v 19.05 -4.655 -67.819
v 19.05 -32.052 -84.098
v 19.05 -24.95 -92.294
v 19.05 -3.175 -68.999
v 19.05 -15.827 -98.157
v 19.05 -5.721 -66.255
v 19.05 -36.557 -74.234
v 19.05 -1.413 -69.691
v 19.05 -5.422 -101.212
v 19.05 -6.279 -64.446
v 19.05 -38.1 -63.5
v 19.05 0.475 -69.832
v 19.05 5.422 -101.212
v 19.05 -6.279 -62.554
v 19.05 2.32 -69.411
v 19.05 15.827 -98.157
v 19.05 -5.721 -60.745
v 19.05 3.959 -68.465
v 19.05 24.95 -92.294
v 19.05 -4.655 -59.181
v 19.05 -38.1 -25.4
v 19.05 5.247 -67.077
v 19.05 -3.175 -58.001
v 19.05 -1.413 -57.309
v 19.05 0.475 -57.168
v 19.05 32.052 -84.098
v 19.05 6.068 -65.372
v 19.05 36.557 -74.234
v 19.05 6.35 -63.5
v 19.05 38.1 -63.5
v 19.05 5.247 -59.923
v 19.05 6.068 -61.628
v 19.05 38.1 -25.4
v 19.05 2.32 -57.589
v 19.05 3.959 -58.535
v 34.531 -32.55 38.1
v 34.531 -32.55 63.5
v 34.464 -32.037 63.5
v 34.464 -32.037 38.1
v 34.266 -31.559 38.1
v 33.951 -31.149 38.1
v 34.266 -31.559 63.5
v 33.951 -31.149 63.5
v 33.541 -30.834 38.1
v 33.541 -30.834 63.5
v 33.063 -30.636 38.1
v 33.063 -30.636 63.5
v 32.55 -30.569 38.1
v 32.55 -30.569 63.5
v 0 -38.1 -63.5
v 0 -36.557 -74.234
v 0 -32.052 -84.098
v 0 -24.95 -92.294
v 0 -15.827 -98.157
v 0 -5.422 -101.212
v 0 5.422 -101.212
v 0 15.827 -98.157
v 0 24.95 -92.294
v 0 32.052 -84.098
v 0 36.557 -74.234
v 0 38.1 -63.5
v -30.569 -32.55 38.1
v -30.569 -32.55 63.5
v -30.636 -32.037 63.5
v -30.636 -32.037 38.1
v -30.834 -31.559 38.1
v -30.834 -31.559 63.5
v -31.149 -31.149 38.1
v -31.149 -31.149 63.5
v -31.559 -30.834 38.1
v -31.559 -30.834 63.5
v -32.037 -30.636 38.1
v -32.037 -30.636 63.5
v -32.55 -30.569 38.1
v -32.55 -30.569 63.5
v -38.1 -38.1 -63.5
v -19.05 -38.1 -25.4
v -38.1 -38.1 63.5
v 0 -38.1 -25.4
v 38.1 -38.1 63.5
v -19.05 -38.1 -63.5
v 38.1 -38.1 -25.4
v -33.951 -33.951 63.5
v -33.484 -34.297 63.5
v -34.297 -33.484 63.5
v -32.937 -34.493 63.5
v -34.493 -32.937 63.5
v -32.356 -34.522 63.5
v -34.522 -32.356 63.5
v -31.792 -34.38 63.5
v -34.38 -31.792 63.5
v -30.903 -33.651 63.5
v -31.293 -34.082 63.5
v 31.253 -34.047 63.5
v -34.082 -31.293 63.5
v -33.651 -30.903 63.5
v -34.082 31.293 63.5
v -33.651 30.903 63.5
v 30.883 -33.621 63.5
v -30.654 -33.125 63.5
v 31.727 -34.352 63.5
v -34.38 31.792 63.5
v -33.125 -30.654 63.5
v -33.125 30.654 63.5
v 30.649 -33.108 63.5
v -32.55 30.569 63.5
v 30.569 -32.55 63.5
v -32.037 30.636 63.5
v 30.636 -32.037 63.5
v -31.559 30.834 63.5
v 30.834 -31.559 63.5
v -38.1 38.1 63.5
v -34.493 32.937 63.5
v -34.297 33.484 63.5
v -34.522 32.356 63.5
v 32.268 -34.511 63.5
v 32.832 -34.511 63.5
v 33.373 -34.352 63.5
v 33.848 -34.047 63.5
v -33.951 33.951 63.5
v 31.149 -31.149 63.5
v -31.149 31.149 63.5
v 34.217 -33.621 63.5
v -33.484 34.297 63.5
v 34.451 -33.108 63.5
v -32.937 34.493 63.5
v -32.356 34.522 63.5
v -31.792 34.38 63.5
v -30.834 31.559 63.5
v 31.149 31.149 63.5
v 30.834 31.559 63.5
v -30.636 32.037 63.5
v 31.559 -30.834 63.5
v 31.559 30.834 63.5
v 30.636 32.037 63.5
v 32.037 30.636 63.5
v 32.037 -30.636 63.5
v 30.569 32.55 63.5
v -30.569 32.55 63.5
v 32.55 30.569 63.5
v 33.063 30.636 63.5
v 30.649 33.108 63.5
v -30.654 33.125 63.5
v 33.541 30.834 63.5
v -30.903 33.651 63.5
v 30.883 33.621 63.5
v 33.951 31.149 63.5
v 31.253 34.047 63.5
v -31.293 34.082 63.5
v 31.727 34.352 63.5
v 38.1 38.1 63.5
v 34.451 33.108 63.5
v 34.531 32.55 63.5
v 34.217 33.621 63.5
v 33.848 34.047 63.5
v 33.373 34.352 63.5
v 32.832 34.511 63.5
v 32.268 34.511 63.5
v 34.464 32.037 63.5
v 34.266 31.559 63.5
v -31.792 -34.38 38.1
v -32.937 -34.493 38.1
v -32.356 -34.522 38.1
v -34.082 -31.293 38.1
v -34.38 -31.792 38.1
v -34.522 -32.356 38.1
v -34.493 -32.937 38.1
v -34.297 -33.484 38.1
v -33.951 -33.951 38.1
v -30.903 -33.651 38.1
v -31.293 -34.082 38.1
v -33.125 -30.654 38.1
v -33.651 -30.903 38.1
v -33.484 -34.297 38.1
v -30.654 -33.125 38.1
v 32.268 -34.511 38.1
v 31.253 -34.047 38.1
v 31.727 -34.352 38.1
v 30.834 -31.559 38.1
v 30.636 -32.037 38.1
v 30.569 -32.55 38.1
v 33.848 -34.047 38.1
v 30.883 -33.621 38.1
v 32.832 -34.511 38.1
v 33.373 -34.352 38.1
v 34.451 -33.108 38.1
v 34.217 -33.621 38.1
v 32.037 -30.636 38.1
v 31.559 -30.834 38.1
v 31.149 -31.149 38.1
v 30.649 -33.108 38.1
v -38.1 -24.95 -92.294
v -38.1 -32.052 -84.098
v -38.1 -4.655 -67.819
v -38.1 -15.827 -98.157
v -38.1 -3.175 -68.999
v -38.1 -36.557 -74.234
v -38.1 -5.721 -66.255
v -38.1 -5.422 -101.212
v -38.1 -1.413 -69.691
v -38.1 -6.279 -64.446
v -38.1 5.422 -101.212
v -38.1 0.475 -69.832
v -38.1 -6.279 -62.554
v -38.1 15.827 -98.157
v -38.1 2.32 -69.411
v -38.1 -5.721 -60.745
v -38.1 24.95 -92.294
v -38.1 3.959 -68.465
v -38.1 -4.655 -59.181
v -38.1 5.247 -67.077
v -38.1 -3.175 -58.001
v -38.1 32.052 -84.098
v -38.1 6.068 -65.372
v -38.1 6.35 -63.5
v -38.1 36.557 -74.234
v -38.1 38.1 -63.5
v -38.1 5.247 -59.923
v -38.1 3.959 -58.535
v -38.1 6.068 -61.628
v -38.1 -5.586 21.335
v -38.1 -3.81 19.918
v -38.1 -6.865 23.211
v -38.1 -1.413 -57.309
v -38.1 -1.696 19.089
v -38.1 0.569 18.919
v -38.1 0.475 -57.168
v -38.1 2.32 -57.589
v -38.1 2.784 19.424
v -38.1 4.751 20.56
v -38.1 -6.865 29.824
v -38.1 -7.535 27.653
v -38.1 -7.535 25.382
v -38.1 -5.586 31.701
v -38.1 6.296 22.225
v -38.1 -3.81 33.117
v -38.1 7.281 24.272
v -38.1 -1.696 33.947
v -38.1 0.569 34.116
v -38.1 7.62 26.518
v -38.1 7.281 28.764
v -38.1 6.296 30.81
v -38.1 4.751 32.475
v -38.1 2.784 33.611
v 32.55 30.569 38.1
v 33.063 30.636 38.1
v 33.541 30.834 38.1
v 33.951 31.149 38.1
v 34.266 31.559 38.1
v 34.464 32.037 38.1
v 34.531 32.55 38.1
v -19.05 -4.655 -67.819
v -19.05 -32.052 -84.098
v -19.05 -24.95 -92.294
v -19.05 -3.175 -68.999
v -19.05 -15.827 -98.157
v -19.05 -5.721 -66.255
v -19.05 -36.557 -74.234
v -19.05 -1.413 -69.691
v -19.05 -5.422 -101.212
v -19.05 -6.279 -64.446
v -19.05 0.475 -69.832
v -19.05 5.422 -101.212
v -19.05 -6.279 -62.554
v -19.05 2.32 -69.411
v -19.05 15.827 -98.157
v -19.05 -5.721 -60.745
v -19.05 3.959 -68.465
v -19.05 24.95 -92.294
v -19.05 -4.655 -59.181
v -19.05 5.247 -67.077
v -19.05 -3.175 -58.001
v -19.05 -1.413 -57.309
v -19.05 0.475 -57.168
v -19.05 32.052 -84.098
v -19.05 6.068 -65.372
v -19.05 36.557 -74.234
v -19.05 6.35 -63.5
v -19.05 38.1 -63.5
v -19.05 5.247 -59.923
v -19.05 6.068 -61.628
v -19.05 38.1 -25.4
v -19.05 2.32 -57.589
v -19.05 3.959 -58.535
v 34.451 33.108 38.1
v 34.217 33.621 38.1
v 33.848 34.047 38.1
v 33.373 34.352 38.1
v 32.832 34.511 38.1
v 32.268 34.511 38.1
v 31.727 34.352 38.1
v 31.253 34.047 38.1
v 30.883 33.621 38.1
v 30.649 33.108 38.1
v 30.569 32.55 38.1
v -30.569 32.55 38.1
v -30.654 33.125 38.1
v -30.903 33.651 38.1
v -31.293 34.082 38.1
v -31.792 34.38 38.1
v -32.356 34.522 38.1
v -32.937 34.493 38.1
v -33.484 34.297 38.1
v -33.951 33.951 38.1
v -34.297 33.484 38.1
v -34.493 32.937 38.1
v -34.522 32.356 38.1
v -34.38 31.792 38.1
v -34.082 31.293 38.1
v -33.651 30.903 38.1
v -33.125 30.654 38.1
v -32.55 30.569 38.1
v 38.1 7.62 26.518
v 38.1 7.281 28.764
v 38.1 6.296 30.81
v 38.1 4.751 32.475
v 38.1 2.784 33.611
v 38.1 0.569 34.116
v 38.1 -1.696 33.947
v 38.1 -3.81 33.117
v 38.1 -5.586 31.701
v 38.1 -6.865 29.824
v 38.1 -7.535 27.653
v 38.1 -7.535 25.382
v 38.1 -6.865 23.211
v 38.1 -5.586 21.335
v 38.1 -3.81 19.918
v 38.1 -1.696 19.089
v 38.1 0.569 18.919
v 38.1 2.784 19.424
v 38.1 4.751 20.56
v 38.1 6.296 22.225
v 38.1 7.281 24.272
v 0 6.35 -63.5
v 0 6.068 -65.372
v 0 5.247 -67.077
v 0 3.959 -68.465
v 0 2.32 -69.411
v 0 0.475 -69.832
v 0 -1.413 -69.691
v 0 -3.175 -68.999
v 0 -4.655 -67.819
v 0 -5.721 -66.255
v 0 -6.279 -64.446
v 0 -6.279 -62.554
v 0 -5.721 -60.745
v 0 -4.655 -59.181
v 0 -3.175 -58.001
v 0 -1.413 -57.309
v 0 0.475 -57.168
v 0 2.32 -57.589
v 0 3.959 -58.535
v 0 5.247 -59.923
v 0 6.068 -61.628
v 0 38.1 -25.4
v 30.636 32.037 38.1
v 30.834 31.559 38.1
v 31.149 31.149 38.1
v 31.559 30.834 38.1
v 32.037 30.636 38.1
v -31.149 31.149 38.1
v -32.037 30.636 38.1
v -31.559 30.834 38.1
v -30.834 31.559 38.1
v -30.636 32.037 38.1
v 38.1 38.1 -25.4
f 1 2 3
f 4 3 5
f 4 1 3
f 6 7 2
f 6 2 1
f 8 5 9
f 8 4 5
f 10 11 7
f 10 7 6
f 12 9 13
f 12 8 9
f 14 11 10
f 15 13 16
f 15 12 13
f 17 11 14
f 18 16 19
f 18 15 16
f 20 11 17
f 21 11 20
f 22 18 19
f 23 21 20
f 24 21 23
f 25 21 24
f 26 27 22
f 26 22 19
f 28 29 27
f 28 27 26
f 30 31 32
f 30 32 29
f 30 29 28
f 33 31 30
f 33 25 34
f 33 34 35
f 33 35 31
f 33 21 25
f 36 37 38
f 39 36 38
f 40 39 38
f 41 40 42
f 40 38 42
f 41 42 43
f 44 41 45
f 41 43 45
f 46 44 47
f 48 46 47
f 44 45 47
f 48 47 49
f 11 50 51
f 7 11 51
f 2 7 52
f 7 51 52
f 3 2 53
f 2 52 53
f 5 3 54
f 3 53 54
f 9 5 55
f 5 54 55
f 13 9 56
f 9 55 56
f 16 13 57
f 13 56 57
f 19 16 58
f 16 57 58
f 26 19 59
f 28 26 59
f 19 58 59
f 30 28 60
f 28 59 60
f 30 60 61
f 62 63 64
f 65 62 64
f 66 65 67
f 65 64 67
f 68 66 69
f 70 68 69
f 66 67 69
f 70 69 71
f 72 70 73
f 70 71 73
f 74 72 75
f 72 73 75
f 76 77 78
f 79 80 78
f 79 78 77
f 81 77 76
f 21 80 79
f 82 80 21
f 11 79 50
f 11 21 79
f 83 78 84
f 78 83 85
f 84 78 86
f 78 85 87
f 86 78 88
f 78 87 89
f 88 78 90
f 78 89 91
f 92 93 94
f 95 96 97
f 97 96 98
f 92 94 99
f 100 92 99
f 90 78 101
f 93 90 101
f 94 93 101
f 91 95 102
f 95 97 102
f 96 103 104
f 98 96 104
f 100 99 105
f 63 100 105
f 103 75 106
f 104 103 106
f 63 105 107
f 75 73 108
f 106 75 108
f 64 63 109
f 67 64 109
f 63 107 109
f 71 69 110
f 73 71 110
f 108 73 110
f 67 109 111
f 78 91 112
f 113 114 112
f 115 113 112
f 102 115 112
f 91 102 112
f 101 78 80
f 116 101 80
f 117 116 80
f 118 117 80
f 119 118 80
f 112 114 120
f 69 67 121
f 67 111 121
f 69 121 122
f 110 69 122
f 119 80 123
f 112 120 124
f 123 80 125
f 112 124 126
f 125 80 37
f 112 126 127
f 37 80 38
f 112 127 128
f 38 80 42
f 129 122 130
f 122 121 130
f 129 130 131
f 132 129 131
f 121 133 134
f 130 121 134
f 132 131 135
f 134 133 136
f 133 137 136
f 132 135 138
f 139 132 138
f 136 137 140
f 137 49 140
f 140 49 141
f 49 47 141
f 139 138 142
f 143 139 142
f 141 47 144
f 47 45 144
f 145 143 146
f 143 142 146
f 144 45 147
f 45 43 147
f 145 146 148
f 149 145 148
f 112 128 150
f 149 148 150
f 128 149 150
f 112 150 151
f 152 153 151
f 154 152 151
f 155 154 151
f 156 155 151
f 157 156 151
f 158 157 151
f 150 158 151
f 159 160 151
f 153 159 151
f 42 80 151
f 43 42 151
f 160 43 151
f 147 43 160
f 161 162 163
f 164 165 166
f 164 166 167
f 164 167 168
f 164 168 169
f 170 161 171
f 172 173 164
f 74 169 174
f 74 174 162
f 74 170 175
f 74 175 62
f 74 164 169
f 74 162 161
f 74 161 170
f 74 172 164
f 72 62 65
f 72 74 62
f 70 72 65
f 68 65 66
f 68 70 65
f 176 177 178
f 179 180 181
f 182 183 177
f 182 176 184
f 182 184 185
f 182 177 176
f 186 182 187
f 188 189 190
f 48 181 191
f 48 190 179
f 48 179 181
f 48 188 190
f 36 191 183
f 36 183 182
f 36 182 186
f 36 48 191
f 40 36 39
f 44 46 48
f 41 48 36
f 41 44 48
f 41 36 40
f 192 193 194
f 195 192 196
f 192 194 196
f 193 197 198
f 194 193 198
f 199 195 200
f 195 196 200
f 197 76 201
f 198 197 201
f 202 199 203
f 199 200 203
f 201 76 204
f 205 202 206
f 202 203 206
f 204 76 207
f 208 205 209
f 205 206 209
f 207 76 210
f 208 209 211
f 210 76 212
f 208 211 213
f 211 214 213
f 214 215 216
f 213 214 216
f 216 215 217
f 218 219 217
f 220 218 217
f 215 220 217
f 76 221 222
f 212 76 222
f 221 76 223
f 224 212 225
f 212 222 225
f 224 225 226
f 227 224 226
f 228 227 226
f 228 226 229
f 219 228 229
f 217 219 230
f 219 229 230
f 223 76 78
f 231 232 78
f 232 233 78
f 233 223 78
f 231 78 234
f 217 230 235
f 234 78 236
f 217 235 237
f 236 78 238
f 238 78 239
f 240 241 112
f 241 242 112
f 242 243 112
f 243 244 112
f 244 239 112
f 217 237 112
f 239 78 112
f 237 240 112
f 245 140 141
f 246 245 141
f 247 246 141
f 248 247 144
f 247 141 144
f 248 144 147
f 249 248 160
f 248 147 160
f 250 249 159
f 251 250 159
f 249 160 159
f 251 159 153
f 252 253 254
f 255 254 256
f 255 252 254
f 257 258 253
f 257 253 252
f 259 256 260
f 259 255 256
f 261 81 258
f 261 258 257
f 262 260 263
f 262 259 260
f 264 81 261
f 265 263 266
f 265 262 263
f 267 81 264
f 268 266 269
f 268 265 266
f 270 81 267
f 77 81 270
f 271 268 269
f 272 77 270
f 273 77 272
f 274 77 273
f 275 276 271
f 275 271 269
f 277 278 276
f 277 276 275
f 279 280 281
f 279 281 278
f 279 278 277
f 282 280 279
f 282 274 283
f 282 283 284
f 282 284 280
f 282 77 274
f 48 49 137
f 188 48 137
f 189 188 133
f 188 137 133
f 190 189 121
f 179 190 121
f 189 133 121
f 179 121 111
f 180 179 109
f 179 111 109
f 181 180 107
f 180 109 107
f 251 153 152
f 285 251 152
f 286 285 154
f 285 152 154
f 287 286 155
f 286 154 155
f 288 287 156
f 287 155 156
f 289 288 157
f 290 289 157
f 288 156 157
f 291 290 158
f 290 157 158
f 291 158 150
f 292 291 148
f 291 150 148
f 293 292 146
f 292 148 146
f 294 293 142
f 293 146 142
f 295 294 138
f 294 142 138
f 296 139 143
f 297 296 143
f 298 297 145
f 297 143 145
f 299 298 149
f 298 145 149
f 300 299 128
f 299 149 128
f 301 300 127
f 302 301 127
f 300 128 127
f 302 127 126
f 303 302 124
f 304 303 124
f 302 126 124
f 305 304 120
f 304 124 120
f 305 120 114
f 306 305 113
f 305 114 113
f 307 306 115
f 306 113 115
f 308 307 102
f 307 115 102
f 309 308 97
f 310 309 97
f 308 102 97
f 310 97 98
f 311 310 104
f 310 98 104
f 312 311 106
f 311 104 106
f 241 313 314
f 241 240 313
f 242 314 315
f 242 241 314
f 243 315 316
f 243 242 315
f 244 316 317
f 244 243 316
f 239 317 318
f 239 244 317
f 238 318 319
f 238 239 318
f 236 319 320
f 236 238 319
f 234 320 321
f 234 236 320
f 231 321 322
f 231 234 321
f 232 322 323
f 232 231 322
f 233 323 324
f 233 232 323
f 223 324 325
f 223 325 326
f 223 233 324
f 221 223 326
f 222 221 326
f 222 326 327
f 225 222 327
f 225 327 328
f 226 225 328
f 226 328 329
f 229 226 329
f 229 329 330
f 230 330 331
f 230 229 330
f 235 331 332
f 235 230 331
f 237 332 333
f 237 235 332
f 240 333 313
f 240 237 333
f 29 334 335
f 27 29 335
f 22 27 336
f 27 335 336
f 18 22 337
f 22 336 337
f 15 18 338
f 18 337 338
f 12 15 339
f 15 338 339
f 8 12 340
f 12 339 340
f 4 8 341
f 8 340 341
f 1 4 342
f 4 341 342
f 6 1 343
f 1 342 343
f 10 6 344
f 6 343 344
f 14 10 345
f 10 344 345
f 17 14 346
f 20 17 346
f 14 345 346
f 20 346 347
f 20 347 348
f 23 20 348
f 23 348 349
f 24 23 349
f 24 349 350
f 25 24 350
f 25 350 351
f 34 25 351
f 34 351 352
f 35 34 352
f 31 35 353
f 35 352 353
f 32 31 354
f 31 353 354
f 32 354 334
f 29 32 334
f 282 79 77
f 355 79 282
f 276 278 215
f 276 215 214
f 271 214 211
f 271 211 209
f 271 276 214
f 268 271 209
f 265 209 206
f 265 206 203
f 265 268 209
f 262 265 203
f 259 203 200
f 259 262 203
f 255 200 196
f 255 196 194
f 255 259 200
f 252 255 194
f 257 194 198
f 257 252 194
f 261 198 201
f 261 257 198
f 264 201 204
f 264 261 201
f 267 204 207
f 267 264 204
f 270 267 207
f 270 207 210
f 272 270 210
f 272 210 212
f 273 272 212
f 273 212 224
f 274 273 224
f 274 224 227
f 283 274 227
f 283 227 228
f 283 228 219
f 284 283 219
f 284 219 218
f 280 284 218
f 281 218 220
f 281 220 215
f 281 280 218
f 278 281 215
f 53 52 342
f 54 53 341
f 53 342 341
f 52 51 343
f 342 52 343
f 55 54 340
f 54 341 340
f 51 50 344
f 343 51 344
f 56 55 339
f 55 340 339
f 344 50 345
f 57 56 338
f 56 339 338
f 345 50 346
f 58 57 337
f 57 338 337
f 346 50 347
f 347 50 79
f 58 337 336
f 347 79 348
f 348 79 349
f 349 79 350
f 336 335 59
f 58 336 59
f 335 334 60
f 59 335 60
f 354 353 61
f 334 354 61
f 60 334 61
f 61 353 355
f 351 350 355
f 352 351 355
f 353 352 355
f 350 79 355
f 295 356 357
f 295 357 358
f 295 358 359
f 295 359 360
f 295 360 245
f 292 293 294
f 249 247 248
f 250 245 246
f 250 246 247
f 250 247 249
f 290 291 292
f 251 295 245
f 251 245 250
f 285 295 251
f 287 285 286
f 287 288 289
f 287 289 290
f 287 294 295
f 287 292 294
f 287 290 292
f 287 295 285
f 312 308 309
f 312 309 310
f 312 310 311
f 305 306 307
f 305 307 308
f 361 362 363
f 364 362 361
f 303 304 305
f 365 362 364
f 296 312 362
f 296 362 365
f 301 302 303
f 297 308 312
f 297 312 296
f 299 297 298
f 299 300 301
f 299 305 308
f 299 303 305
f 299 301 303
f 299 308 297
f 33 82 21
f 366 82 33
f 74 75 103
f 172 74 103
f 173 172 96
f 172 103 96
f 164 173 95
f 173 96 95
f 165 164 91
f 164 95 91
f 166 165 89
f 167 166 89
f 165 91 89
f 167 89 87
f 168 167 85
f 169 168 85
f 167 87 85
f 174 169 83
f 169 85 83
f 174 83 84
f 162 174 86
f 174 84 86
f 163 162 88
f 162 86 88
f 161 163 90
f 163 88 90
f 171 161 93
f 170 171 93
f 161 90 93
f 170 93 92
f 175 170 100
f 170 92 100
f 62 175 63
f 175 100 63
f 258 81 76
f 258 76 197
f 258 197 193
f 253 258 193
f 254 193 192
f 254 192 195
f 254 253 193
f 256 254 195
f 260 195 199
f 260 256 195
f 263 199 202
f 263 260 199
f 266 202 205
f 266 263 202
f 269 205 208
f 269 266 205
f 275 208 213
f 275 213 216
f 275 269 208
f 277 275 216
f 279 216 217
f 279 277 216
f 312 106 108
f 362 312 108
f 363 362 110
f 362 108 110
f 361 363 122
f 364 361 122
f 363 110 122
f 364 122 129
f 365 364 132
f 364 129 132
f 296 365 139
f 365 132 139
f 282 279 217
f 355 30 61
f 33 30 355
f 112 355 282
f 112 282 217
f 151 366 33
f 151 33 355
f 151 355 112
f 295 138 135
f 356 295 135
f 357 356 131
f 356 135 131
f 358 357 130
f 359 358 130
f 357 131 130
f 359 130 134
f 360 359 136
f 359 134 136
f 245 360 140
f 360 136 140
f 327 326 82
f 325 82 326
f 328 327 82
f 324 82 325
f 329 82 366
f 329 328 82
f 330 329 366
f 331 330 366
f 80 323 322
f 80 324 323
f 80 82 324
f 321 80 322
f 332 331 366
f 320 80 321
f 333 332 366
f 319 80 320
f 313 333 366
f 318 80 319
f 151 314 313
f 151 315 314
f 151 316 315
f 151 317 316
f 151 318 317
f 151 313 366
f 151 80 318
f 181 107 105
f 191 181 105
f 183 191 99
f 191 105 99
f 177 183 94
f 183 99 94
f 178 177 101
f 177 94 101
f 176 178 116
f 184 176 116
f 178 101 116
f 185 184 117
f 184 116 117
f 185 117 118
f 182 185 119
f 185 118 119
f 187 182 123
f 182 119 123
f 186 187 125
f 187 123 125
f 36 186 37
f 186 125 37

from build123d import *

# Parameters (mm, degrees)
F0_W     = 76.2
F0_H     = 88.9
F0_R     = 7.62
F1_DEPTH = 38.1
F2_DEPTH = 19.05
F3_START = -19.05
F3_DEPTH = 19.05
F5_DEPTH = 25.4


with BuildPart() as f1:
    # F0 (on Right) → F1 (new body, symmetric)
    with BuildSketch(Plane.YZ):
        with Locations((0, 19.05)):
            Rectangle(F0_W, F0_H)
        with Locations((0, 26.5176)):
            Circle(F0_R, mode=Mode.SUBTRACT)
    extrude(amount=F1_DEPTH, both=True)

    # F0 (on Right) → F2 (join)
    with BuildSketch(Plane.YZ):
        with BuildLine():
            Line((6.35, -63.5), (38.1, -63.5))
            Line((38.1, -63.5), (38.1, -25.4))
            Line((38.1, -25.4), (-38.1, -25.4))
            Line((-38.1, -25.4), (-38.1, -63.5))
            Line((-38.1, -63.5), (-6.35, -63.5))
            ThreePointArc((-6.35, -63.5), (0, -57.15), (6.35, -63.5))
        make_face()
        with BuildLine():
            ThreePointArc((-38.1, -63.5), (0, -101.6), (38.1, -63.5))
            Line((38.1, -63.5), (6.35, -63.5))
            ThreePointArc((6.35, -63.5), (0, -69.85), (-6.35, -63.5))
            Line((-6.35, -63.5), (-38.1, -63.5))
        make_face()
    extrude(amount=F2_DEPTH)

    # F0 (on Right) → F3 (join)
    with BuildSketch(Plane.YZ.offset(F3_START)):
        with BuildLine():
            Line((6.35, -63.5), (38.1, -63.5))
            Line((38.1, -63.5), (38.1, -25.4))
            Line((38.1, -25.4), (-38.1, -25.4))
            Line((-38.1, -25.4), (-38.1, -63.5))
            Line((-38.1, -63.5), (-6.35, -63.5))
            ThreePointArc((-6.35, -63.5), (0, -57.15), (6.35, -63.5))
        make_face()
        with BuildLine():
            ThreePointArc((-38.1, -63.5), (0, -101.6), (38.1, -63.5))
            Line((38.1, -63.5), (6.35, -63.5))
            ThreePointArc((6.35, -63.5), (0, -69.85), (-6.35, -63.5))
            Line((-6.35, -63.5), (-38.1, -63.5))
        make_face()
    extrude(amount=-F3_DEPTH)

    # F4 (on face) → F5 (cut)
    with BuildSketch(Plane.XY.offset(63.5)):
        with BuildLine():
            ThreePointArc((-30.5689, 32.5501), (-33.9510199549, 33.9510199549), (-32.5501, 30.5689))
            Line((-32.5501, 30.5689), (-32.5501, 32.5501))
            Line((-32.5501, 32.5501), (-30.5689, 32.5501))
        make_face()
        with BuildLine():
            Line((-32.5501, 32.5501), (-32.5501, 30.5689))
            ThreePointArc((-32.5501, 30.5689), (-31.1491800451, 31.1491800451), (-30.5689, 32.5501))
            Line((-30.5689, 32.5501), (-32.5501, 32.5501))
        make_face()
        with BuildLine():
            ThreePointArc((30.5689, 32.5501), (31.1491800451, 31.1491800451), (32.5501, 30.5689))
            Line((32.5501, 30.5689), (32.5501, 32.5501))
            Line((32.5501, 32.5501), (30.5689, 32.5501))
        make_face()
        with BuildLine():
            Line((32.5501, 32.5501), (32.5501, 30.5689))
            ThreePointArc((32.5501, 30.5689), (33.9510199549, 31.1491800451), (34.5313, 32.5501))
            ThreePointArc((34.5313, 32.5501), (32.5501, 34.5313), (30.5689, 32.5501))
            Line((30.5689, 32.5501), (32.5501, 32.5501))
        make_face()
        with BuildLine():
            ThreePointArc((-32.5501, -30.5689), (-33.9510199549, -33.9510199549), (-30.5689, -32.5501))
            Line((-30.5689, -32.5501), (-32.5501, -32.5501))
            Line((-32.5501, -32.5501), (-32.5501, -30.5689))
        make_face()
        with BuildLine():
            Line((-32.5501, -32.5501), (-30.5689, -32.5501))
            ThreePointArc((-30.5689, -32.5501), (-31.1491800451, -31.1491800451), (-32.5501, -30.5689))
            Line((-32.5501, -30.5689), (-32.5501, -32.5501))
        make_face()
        with BuildLine():
            Line((32.5501, -32.5501), (30.5689, -32.5501))
            ThreePointArc((30.5689, -32.5501), (32.5501, -34.5313), (34.5313, -32.5501))
            ThreePointArc((34.5313, -32.5501), (33.9510199549, -31.1491800451), (32.5501, -30.5689))
            Line((32.5501, -30.5689), (32.5501, -32.5501))
        make_face()
        with BuildLine():
            ThreePointArc((32.5501, -30.5689), (31.1491800451, -31.1491800451), (30.5689, -32.5501))
            Line((30.5689, -32.5501), (32.5501, -32.5501))
            Line((32.5501, -32.5501), (32.5501, -30.5689))
        make_face()
    extrude(amount=-F5_DEPTH, mode=Mode.SUBTRACT)


solid = f1.part
